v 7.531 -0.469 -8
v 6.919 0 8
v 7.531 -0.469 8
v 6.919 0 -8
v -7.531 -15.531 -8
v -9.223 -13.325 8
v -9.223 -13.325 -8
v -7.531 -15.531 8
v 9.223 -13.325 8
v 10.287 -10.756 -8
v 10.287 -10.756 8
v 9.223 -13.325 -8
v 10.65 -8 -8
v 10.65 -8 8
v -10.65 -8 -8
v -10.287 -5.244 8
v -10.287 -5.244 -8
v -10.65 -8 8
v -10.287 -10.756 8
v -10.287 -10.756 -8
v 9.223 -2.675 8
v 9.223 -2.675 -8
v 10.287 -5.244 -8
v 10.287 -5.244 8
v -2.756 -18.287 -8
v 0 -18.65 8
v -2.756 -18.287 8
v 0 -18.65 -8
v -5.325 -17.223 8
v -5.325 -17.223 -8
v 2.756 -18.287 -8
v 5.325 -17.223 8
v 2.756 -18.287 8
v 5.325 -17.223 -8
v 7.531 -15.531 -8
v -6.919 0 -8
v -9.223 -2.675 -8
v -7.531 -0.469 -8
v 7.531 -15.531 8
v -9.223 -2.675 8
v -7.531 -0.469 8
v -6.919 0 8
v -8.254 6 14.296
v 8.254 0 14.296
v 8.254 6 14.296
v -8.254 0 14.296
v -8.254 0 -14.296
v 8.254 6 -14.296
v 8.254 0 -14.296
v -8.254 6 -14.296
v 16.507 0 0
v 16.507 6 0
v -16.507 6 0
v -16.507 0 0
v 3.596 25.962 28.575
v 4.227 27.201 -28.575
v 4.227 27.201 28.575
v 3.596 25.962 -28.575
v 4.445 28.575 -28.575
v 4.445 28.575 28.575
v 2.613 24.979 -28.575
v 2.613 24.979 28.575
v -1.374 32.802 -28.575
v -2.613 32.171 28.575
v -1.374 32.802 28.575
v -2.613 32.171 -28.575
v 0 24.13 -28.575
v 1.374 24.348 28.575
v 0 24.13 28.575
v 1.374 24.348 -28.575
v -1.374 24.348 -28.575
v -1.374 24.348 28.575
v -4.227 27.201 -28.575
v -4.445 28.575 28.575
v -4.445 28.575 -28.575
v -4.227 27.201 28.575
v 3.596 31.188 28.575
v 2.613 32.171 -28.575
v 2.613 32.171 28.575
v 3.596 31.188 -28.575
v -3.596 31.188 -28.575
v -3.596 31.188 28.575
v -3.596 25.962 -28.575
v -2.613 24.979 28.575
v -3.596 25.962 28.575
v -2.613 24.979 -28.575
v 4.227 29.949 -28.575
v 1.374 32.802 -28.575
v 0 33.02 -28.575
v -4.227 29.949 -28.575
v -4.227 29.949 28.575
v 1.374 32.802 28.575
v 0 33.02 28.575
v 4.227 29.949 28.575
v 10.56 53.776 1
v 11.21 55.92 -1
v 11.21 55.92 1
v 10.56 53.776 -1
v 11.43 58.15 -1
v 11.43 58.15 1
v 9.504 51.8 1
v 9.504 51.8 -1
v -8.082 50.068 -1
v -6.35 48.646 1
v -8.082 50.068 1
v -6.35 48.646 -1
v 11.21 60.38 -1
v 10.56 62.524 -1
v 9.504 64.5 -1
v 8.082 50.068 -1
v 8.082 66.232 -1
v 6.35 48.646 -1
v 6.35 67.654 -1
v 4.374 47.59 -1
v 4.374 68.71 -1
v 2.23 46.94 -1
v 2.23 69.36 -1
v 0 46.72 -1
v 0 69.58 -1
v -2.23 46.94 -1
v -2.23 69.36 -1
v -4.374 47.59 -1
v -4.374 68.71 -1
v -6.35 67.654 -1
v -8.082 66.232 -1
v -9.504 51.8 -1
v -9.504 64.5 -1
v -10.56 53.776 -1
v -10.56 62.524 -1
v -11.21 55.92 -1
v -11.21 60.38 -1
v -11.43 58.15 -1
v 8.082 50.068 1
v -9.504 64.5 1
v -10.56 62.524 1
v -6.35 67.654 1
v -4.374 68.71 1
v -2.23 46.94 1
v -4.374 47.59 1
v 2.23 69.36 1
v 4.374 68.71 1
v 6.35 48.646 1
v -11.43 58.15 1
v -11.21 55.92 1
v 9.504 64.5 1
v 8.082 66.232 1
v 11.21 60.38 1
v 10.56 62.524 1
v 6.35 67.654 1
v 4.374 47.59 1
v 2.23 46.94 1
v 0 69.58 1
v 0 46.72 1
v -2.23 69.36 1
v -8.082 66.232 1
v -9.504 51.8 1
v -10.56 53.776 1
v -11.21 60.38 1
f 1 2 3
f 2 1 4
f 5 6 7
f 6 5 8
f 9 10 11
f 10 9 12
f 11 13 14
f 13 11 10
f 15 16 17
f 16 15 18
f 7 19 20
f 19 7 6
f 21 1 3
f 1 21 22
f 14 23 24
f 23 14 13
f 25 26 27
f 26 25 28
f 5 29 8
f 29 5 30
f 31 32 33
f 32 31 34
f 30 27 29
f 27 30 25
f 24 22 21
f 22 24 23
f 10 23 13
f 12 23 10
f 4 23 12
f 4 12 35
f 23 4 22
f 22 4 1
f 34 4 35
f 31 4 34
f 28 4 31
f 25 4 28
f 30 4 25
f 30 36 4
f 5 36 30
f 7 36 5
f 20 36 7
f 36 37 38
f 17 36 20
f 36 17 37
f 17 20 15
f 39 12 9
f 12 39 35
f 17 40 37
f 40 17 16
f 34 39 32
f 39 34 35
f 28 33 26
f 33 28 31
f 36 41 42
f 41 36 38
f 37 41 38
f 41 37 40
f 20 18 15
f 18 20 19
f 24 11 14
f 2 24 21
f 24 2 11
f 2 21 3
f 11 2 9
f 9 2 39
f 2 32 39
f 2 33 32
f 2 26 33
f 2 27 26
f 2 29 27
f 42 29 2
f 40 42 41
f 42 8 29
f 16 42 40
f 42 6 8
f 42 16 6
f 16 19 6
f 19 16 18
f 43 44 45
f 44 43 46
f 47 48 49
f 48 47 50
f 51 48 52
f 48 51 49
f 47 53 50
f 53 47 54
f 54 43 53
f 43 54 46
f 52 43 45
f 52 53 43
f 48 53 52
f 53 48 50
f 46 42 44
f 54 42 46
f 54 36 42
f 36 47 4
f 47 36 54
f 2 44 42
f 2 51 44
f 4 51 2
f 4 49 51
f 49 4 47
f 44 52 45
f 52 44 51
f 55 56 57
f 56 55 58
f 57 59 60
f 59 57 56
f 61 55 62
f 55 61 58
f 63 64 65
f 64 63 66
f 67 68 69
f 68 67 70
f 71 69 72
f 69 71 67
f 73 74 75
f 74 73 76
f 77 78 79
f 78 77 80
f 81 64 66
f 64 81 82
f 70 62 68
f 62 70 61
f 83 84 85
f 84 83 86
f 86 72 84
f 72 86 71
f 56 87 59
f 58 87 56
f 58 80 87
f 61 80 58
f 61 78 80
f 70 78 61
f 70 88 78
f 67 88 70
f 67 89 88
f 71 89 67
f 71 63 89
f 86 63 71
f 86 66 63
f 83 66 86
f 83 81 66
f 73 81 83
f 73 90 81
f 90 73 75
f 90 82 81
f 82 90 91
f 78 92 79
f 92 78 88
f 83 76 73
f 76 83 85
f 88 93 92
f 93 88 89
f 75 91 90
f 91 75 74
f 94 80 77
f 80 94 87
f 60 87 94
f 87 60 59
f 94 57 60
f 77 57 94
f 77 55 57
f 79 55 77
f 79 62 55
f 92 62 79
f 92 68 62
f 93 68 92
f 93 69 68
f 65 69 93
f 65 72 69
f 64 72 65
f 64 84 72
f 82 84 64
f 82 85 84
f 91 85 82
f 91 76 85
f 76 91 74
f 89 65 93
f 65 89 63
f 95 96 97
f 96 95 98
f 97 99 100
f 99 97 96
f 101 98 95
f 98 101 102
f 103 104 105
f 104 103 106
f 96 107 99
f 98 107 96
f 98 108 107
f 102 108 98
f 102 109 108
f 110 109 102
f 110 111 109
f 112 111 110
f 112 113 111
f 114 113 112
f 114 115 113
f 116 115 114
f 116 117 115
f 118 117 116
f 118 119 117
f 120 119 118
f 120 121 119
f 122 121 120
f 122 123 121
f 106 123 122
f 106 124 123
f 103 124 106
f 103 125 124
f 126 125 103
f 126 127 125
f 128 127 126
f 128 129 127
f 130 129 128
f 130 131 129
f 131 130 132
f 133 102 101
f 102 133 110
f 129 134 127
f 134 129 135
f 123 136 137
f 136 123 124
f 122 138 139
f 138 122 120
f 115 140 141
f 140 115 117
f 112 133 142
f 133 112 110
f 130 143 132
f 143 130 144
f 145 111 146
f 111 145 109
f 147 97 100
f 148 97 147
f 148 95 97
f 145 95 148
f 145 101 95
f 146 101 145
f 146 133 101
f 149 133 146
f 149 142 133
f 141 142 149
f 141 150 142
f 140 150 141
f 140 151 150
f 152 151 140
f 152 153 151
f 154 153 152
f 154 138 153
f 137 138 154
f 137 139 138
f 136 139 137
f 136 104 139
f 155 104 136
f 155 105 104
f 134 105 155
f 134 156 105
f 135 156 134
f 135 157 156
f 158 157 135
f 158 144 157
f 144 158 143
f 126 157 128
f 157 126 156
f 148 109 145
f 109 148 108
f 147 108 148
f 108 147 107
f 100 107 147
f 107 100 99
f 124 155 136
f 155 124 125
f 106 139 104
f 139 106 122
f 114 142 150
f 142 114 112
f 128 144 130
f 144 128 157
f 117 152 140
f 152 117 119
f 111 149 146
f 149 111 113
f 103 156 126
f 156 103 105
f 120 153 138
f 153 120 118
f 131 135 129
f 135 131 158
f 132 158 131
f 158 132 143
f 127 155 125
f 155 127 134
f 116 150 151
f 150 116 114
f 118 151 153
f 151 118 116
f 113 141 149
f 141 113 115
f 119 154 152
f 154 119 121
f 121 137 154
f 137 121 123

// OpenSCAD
// Auto-generated by scripts/author_from_manifest.py (Phase D.3).
// Source: data/phase_d_manifest.json (sku_intent='tyco-ty3151-upright-155f').
// Do not hand-edit — regenerate from the manifest.
//
// @part tyco_ty3151_upright_155f
// @kind sprinkler_head
// @category head.upright.k56
// @display-name "Tyco TY3151 Upright K5.6 SR 155°F"
// @mfg tyco_fire_protection
// @mfg-pn TY3151
// @listing UL FM
// @hazard-classes LH OH1
// @price-usd 13.80
// @install-minutes 8
// @crew journeyman
// @k-factor 5.6
// @orientation upright
// @response standard
// @temperature 155F
// @param size_in number default=0.5 label="Size" unit="in"
// @port inlet position=[0,0.014,0] direction=[0,1,0] style=NPT_threaded size_in=0.5 role=drop

size_in = 0.5;
k_factor = 5.6;

length_mm   = 57.15;
body_dia_mm = 25.40;
thread_od   = 21.3;
thread_len  = 16;
deflector_d = body_dia_mm * 0.9;

rotate([180,0,0]) union() {
    translate([0, thread_len/2, 0])
        cylinder(h = thread_len, d = thread_od, center = true, $fn = 24);
    translate([0, -3, 0])
        rotate([90, 0, 0])
        cylinder(h = 6, d = thread_od * 1.55, $fn = 6, center = true);
    translate([0, -length_mm/2, 0])
        cylinder(h = length_mm, d = body_dia_mm * 0.35, center = true, $fn = 20);
    translate([0, -length_mm - 1, 0])
        cylinder(h = 2, d = deflector_d, center = true, $fn = 32);
}
